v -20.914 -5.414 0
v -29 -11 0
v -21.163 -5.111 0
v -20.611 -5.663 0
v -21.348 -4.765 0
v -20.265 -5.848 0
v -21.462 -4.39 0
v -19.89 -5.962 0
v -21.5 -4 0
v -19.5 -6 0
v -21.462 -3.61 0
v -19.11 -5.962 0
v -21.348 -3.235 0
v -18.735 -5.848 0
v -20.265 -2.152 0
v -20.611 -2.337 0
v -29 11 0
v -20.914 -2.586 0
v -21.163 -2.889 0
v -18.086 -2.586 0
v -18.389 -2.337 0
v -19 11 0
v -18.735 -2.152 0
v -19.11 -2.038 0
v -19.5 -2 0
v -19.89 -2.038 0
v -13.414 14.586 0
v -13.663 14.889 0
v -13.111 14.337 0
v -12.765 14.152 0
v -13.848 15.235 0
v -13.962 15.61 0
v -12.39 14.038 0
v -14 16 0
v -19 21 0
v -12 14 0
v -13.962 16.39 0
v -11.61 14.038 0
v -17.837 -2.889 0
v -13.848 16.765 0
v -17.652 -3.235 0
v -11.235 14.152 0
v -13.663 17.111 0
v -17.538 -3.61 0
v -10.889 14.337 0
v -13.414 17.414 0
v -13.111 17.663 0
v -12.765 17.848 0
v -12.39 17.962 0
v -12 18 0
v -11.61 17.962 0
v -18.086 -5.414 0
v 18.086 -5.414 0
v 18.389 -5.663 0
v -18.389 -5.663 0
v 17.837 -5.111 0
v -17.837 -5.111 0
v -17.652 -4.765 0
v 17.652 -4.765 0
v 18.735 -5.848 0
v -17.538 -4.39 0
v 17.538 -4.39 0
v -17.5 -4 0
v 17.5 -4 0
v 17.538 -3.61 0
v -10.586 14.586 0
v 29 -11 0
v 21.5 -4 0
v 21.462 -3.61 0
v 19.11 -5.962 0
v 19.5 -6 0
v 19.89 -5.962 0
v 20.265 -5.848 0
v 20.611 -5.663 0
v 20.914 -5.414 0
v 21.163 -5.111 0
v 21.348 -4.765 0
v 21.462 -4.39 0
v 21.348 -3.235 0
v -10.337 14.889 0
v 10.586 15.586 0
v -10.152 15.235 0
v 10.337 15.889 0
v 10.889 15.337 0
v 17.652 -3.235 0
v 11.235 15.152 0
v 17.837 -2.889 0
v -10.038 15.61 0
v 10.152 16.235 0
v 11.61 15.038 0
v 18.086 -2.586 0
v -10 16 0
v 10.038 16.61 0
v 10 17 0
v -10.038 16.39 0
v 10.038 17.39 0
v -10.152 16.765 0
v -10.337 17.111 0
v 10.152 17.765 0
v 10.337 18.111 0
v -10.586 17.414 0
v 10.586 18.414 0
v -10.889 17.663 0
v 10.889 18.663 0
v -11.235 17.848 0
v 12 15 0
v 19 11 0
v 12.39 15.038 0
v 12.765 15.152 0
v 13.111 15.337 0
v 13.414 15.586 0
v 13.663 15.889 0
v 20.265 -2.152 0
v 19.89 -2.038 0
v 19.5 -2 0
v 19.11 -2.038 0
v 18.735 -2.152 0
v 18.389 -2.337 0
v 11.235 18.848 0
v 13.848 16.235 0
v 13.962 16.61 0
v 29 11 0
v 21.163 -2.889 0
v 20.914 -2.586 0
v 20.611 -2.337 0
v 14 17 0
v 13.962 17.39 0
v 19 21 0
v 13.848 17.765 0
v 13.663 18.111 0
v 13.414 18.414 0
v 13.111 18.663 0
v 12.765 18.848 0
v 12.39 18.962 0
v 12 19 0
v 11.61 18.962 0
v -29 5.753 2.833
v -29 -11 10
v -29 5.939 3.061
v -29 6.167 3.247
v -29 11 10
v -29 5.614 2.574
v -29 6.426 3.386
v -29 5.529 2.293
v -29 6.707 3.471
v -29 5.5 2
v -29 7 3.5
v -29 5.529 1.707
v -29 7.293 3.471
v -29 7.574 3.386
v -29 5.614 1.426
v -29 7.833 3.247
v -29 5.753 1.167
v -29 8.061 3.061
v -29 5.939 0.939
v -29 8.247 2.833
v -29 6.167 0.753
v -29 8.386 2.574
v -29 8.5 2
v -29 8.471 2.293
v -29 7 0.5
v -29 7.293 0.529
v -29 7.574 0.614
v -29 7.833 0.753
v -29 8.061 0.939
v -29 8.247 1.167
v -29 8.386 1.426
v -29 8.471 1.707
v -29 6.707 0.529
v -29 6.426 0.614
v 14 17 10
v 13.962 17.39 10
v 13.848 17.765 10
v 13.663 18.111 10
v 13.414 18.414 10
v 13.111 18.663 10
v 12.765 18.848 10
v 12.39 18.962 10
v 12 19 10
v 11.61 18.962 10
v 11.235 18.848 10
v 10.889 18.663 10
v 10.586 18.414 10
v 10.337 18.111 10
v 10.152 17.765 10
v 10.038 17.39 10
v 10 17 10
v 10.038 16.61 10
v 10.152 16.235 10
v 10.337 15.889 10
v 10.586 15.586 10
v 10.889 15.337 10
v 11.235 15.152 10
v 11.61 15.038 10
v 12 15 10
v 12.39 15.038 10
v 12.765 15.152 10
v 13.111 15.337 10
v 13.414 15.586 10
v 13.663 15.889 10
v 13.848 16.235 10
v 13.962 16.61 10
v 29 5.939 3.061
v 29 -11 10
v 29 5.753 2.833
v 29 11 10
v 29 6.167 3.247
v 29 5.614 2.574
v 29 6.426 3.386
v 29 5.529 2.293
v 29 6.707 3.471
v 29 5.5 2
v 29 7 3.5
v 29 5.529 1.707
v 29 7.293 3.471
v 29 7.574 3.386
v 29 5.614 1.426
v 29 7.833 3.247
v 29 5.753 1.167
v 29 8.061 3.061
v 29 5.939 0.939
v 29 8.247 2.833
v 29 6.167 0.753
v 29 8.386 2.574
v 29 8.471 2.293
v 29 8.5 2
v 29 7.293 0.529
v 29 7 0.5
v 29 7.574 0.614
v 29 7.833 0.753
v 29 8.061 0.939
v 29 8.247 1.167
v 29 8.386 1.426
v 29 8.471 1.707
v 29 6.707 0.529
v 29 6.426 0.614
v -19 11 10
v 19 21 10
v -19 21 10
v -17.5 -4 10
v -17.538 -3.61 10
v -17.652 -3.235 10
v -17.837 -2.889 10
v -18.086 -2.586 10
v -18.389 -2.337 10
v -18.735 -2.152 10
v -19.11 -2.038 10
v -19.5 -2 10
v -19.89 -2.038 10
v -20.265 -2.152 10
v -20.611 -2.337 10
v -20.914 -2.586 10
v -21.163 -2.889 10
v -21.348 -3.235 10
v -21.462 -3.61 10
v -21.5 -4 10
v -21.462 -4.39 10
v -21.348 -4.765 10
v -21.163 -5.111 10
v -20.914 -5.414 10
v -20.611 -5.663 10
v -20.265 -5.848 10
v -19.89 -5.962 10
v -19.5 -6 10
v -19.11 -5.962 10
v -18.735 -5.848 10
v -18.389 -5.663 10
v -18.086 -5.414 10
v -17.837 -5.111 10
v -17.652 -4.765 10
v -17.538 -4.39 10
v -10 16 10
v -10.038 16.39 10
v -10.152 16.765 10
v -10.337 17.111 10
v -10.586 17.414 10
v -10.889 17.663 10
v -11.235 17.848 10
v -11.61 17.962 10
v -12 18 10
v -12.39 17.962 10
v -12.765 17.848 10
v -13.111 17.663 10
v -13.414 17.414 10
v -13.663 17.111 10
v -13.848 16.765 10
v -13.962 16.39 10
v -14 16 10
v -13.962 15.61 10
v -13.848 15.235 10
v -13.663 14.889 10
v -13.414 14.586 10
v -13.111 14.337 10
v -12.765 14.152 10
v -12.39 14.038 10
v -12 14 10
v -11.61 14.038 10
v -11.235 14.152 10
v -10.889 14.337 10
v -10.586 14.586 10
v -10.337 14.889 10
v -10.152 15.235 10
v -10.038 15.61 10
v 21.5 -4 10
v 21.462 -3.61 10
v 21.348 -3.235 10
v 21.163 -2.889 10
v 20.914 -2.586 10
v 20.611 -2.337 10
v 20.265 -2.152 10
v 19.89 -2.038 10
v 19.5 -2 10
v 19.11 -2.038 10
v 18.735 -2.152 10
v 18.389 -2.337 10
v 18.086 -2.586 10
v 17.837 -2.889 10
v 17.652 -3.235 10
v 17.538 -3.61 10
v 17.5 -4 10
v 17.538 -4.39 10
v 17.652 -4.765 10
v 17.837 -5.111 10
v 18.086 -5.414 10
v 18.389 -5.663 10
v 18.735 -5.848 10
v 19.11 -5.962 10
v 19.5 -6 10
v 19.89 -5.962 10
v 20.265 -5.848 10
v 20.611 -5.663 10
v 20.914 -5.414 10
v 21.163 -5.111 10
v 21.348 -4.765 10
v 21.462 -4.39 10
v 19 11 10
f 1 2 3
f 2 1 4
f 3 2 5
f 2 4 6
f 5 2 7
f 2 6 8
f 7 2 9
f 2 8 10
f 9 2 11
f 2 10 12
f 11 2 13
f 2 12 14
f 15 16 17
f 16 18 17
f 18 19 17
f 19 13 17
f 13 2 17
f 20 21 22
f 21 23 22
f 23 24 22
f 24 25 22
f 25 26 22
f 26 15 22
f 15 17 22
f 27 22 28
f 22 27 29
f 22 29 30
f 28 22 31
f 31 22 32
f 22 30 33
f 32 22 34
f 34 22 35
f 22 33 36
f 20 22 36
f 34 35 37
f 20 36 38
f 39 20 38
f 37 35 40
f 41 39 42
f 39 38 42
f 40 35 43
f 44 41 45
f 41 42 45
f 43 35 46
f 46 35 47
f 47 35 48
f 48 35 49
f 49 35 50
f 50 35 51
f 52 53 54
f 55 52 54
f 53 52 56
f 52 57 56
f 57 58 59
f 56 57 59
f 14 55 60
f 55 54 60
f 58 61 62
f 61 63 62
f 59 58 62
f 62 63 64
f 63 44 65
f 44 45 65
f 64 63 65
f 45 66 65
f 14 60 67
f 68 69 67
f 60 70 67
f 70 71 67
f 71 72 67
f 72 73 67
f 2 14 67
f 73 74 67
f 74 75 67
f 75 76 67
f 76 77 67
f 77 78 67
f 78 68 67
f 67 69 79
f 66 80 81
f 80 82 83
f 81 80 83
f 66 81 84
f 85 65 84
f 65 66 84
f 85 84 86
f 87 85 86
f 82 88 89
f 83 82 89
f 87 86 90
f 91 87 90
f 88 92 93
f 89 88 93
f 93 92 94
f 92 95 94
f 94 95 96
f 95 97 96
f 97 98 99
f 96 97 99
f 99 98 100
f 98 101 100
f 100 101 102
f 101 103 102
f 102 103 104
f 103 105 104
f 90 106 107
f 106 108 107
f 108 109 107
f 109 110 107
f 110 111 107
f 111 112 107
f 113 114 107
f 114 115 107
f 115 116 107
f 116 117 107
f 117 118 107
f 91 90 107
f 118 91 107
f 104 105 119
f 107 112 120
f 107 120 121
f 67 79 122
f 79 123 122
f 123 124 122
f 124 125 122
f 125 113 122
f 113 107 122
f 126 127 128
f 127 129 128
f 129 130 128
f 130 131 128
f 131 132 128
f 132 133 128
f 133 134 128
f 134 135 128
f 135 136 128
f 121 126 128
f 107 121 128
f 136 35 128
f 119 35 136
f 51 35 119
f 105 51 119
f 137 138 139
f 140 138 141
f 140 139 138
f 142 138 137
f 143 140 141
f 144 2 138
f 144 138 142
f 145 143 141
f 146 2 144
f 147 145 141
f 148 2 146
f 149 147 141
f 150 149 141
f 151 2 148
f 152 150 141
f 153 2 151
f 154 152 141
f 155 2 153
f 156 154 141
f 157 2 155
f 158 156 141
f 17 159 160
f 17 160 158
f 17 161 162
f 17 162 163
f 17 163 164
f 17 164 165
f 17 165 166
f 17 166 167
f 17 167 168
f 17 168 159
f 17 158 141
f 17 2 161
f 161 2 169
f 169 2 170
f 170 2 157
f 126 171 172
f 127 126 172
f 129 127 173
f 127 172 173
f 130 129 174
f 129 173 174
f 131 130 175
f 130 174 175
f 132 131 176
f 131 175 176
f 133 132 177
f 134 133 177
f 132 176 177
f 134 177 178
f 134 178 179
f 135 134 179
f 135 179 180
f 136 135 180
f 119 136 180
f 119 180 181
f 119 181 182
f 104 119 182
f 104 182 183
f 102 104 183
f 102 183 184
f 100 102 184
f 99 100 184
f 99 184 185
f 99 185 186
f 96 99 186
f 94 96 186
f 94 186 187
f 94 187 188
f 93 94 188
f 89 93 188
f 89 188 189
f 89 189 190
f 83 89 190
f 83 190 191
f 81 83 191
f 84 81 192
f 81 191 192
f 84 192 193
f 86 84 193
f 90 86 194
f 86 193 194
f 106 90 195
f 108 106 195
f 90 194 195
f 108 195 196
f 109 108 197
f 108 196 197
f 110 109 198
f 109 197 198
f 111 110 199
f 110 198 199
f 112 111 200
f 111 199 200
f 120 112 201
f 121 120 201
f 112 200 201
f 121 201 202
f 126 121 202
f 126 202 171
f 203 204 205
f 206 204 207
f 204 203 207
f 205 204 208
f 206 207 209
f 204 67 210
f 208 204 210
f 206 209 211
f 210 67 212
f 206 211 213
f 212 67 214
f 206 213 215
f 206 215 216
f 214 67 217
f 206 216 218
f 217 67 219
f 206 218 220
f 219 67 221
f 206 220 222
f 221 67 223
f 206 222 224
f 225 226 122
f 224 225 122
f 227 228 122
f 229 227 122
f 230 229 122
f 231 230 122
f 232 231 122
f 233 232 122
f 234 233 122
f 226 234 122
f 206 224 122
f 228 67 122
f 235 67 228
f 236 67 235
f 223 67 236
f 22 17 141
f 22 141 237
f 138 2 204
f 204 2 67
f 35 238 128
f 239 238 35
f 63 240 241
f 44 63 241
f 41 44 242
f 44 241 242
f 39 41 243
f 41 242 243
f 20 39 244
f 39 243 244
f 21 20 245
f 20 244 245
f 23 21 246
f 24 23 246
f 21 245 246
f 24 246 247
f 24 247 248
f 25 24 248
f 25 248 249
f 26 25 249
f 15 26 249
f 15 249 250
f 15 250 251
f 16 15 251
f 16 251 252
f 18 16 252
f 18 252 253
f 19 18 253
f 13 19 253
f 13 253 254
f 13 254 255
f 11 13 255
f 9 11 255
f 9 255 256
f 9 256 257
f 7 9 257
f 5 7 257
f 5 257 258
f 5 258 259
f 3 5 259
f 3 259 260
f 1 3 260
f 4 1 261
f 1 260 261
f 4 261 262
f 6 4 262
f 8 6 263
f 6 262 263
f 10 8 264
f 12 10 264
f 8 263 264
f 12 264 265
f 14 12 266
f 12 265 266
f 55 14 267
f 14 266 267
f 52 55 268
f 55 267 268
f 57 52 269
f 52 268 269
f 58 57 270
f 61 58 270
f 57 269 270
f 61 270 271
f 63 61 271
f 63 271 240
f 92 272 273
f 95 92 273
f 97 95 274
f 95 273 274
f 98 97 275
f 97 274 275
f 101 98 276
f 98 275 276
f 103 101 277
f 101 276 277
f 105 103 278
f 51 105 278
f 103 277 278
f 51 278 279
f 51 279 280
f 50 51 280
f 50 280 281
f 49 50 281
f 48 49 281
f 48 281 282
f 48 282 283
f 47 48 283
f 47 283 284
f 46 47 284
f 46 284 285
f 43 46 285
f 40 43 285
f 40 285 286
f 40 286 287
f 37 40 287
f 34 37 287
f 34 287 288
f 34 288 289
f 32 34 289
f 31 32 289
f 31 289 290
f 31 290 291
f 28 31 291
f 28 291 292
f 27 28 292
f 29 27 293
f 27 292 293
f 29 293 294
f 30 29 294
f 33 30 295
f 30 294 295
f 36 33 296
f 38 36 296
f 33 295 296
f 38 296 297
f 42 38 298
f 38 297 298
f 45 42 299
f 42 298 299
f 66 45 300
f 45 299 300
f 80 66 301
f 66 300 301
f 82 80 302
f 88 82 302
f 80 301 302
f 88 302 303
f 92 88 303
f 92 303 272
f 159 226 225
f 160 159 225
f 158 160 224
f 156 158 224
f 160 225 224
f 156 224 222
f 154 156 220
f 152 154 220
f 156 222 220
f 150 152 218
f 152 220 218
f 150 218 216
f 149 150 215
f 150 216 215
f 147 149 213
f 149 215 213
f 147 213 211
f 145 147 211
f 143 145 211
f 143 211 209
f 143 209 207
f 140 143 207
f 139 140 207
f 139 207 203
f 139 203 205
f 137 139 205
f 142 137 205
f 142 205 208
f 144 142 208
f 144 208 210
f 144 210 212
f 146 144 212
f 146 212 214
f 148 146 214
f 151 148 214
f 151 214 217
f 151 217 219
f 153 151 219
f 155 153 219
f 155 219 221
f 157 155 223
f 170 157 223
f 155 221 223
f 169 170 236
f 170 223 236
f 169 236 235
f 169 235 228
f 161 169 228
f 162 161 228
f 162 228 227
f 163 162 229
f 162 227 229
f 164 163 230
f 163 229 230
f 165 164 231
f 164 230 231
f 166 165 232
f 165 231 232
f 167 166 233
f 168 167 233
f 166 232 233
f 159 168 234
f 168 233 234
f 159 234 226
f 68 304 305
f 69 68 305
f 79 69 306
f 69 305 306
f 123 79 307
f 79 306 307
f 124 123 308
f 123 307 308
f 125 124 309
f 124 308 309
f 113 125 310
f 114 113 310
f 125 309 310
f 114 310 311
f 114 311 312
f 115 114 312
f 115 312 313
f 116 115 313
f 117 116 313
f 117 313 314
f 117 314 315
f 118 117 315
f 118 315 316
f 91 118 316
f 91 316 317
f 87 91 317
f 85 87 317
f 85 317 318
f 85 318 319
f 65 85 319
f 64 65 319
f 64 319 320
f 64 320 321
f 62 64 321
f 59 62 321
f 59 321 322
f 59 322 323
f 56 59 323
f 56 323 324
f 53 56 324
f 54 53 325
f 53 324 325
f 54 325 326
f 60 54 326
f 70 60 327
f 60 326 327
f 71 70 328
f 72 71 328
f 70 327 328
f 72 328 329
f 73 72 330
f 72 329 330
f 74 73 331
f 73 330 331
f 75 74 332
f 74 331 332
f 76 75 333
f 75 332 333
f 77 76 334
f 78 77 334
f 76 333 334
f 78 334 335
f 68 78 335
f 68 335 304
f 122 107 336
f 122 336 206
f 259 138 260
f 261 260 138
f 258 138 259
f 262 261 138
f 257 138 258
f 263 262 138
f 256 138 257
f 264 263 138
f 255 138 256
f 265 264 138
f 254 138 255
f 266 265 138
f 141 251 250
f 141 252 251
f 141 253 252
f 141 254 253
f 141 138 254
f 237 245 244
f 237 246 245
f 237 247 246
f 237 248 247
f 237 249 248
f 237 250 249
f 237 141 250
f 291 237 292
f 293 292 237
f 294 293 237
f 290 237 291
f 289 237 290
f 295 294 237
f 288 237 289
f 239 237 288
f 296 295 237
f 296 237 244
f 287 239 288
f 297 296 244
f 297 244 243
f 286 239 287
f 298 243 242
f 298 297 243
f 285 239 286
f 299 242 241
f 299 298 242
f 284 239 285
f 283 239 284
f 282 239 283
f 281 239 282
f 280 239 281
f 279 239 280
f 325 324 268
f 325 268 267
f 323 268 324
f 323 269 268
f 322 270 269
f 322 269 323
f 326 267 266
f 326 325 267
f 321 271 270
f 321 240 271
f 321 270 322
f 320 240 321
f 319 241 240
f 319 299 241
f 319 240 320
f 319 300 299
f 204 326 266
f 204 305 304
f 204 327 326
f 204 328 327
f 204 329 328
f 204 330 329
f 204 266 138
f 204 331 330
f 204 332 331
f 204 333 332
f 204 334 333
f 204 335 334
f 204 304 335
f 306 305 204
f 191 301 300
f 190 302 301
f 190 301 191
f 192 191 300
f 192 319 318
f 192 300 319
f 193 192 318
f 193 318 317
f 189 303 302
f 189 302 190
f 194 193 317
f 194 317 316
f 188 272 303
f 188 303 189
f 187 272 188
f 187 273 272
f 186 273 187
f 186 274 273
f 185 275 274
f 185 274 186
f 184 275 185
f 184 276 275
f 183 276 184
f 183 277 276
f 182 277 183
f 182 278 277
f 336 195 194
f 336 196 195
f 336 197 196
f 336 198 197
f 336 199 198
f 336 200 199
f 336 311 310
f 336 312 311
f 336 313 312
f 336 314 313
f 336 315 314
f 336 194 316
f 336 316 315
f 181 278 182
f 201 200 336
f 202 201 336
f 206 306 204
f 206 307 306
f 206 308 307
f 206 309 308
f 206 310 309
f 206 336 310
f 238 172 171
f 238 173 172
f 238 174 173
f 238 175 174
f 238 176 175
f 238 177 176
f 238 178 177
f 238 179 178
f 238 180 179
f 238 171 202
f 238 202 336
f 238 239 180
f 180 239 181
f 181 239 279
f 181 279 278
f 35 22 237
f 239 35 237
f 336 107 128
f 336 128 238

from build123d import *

# Parameters (mm, degrees)
F0_W     = 58
F0_H     = 22
F1_DEPTH = 10
F2_R     = 2
F3_DEPTH = 25
F4_R     = 1.5
F5_DEPTH = 500
F6_W     = 38
F6_H     = 10
F7_DEPTH = 10
F8_R     = 2
F9_DEPTH = 25


with BuildPart() as f1:
    # F0 (on Top) → F1 (new body)
    with BuildSketch(Plane.XY):
        Rectangle(F0_W, F0_H)
    extrude(amount=F1_DEPTH)

    # F2 (on face) → F3 (cut)
    with BuildSketch(Plane.XY.offset(10)):
        with Locations((-19.5, -4)):
            Circle(F2_R)
        with Locations((19.5, -4)):
            Circle(F2_R)
    extrude(amount=-F3_DEPTH, mode=Mode.SUBTRACT)

    # F4 (on face) → F5 (cut)
    with BuildSketch(Plane.YZ.offset(29)):
        with Locations((7, 2)):
            Circle(F4_R)
    extrude(amount=-F5_DEPTH, mode=Mode.SUBTRACT)

    # F6 (on face) → F7 (join)
    with BuildSketch(Plane(origin=(0, 11, 0), x_dir=(-1, 0, 0), z_dir=(0, 1, 0))):
        with Locations((0, 5)):
            Rectangle(F6_W, F6_H)
    extrude(amount=F7_DEPTH)

    # F8 (on face) → F9 (cut)
    with BuildSketch(Plane.XY.offset(10)):
        with Locations((12, 17)):
            Circle(F8_R)
        with Locations((-12, 16)):
            Circle(F8_R)
    extrude(amount=-F9_DEPTH, mode=Mode.SUBTRACT)


solid = f1.part
